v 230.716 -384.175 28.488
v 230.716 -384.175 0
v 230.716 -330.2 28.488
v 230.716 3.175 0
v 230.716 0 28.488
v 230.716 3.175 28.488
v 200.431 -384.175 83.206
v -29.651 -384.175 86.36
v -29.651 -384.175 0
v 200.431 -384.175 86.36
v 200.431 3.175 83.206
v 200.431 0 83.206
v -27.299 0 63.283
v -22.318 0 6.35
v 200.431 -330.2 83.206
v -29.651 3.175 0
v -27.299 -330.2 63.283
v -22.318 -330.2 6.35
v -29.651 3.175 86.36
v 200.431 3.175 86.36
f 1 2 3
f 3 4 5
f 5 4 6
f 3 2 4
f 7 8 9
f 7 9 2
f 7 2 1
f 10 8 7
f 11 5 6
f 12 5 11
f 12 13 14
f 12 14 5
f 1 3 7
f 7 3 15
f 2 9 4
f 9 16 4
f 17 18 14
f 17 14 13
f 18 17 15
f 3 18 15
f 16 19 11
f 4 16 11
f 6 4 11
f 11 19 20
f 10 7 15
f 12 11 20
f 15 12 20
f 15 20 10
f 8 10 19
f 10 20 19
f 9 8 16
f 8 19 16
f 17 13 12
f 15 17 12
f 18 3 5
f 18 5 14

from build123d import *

# Parameters (mm, degrees)
F1_DEPTH = 3.175
F2_DEPTH = 330.2
F4_DEPTH = 53.975


with BuildPart() as f1:
    # F0 (on Front) → F1 (new body)
    with BuildSketch(Plane.XZ):
        Polygon((-29.6512916684, 86.36), (-29.6512916684, 0), (230.7157522443, 0), (230.7157522443, 28.4875586579), (-22.317701071, 6.35), (-27.298651769, 63.2825269959), (200.4314562148, 83.2063297881), (200.4314562148, 86.36), align=None)
        Polygon((-22.317701071, 6.35), (230.7157522443, 28.4875586579), (200.4314562148, 83.2063297881), (-27.298651769, 63.2825269959), align=None)
    extrude(amount=-F1_DEPTH)

    # F0 (on Front) → F2 (join)
    with BuildSketch(Plane.XZ):
        Polygon((-29.6512916684, 86.36), (-29.6512916684, 0), (230.7157522443, 0), (230.7157522443, 28.4875586579), (-22.317701071, 6.35), (-27.298651769, 63.2825269959), (200.4314562148, 83.2063297881), (200.4314562148, 86.36), align=None)
    extrude(amount=F2_DEPTH)

    # F3 (on face) → F4 (join)
    with BuildSketch(Plane.XZ.offset(330.2)):
        Polygon((-27.298651769, 63.2825269959), (200.4314562148, 83.2063297881), (200.4314562148, 86.36), (-29.6512916684, 86.36), (-29.6512916684, 0), (230.7157522443, 0), (230.7157522443, 28.4875586579), (-22.317701071, 6.35), align=None)
        Polygon((230.7157522443, 28.4875586579), (200.4314562148, 83.2063297881), (-27.298651769, 63.2825269959), (-22.317701071, 6.35), align=None)
    extrude(amount=F4_DEPTH)


solid = f1.part
